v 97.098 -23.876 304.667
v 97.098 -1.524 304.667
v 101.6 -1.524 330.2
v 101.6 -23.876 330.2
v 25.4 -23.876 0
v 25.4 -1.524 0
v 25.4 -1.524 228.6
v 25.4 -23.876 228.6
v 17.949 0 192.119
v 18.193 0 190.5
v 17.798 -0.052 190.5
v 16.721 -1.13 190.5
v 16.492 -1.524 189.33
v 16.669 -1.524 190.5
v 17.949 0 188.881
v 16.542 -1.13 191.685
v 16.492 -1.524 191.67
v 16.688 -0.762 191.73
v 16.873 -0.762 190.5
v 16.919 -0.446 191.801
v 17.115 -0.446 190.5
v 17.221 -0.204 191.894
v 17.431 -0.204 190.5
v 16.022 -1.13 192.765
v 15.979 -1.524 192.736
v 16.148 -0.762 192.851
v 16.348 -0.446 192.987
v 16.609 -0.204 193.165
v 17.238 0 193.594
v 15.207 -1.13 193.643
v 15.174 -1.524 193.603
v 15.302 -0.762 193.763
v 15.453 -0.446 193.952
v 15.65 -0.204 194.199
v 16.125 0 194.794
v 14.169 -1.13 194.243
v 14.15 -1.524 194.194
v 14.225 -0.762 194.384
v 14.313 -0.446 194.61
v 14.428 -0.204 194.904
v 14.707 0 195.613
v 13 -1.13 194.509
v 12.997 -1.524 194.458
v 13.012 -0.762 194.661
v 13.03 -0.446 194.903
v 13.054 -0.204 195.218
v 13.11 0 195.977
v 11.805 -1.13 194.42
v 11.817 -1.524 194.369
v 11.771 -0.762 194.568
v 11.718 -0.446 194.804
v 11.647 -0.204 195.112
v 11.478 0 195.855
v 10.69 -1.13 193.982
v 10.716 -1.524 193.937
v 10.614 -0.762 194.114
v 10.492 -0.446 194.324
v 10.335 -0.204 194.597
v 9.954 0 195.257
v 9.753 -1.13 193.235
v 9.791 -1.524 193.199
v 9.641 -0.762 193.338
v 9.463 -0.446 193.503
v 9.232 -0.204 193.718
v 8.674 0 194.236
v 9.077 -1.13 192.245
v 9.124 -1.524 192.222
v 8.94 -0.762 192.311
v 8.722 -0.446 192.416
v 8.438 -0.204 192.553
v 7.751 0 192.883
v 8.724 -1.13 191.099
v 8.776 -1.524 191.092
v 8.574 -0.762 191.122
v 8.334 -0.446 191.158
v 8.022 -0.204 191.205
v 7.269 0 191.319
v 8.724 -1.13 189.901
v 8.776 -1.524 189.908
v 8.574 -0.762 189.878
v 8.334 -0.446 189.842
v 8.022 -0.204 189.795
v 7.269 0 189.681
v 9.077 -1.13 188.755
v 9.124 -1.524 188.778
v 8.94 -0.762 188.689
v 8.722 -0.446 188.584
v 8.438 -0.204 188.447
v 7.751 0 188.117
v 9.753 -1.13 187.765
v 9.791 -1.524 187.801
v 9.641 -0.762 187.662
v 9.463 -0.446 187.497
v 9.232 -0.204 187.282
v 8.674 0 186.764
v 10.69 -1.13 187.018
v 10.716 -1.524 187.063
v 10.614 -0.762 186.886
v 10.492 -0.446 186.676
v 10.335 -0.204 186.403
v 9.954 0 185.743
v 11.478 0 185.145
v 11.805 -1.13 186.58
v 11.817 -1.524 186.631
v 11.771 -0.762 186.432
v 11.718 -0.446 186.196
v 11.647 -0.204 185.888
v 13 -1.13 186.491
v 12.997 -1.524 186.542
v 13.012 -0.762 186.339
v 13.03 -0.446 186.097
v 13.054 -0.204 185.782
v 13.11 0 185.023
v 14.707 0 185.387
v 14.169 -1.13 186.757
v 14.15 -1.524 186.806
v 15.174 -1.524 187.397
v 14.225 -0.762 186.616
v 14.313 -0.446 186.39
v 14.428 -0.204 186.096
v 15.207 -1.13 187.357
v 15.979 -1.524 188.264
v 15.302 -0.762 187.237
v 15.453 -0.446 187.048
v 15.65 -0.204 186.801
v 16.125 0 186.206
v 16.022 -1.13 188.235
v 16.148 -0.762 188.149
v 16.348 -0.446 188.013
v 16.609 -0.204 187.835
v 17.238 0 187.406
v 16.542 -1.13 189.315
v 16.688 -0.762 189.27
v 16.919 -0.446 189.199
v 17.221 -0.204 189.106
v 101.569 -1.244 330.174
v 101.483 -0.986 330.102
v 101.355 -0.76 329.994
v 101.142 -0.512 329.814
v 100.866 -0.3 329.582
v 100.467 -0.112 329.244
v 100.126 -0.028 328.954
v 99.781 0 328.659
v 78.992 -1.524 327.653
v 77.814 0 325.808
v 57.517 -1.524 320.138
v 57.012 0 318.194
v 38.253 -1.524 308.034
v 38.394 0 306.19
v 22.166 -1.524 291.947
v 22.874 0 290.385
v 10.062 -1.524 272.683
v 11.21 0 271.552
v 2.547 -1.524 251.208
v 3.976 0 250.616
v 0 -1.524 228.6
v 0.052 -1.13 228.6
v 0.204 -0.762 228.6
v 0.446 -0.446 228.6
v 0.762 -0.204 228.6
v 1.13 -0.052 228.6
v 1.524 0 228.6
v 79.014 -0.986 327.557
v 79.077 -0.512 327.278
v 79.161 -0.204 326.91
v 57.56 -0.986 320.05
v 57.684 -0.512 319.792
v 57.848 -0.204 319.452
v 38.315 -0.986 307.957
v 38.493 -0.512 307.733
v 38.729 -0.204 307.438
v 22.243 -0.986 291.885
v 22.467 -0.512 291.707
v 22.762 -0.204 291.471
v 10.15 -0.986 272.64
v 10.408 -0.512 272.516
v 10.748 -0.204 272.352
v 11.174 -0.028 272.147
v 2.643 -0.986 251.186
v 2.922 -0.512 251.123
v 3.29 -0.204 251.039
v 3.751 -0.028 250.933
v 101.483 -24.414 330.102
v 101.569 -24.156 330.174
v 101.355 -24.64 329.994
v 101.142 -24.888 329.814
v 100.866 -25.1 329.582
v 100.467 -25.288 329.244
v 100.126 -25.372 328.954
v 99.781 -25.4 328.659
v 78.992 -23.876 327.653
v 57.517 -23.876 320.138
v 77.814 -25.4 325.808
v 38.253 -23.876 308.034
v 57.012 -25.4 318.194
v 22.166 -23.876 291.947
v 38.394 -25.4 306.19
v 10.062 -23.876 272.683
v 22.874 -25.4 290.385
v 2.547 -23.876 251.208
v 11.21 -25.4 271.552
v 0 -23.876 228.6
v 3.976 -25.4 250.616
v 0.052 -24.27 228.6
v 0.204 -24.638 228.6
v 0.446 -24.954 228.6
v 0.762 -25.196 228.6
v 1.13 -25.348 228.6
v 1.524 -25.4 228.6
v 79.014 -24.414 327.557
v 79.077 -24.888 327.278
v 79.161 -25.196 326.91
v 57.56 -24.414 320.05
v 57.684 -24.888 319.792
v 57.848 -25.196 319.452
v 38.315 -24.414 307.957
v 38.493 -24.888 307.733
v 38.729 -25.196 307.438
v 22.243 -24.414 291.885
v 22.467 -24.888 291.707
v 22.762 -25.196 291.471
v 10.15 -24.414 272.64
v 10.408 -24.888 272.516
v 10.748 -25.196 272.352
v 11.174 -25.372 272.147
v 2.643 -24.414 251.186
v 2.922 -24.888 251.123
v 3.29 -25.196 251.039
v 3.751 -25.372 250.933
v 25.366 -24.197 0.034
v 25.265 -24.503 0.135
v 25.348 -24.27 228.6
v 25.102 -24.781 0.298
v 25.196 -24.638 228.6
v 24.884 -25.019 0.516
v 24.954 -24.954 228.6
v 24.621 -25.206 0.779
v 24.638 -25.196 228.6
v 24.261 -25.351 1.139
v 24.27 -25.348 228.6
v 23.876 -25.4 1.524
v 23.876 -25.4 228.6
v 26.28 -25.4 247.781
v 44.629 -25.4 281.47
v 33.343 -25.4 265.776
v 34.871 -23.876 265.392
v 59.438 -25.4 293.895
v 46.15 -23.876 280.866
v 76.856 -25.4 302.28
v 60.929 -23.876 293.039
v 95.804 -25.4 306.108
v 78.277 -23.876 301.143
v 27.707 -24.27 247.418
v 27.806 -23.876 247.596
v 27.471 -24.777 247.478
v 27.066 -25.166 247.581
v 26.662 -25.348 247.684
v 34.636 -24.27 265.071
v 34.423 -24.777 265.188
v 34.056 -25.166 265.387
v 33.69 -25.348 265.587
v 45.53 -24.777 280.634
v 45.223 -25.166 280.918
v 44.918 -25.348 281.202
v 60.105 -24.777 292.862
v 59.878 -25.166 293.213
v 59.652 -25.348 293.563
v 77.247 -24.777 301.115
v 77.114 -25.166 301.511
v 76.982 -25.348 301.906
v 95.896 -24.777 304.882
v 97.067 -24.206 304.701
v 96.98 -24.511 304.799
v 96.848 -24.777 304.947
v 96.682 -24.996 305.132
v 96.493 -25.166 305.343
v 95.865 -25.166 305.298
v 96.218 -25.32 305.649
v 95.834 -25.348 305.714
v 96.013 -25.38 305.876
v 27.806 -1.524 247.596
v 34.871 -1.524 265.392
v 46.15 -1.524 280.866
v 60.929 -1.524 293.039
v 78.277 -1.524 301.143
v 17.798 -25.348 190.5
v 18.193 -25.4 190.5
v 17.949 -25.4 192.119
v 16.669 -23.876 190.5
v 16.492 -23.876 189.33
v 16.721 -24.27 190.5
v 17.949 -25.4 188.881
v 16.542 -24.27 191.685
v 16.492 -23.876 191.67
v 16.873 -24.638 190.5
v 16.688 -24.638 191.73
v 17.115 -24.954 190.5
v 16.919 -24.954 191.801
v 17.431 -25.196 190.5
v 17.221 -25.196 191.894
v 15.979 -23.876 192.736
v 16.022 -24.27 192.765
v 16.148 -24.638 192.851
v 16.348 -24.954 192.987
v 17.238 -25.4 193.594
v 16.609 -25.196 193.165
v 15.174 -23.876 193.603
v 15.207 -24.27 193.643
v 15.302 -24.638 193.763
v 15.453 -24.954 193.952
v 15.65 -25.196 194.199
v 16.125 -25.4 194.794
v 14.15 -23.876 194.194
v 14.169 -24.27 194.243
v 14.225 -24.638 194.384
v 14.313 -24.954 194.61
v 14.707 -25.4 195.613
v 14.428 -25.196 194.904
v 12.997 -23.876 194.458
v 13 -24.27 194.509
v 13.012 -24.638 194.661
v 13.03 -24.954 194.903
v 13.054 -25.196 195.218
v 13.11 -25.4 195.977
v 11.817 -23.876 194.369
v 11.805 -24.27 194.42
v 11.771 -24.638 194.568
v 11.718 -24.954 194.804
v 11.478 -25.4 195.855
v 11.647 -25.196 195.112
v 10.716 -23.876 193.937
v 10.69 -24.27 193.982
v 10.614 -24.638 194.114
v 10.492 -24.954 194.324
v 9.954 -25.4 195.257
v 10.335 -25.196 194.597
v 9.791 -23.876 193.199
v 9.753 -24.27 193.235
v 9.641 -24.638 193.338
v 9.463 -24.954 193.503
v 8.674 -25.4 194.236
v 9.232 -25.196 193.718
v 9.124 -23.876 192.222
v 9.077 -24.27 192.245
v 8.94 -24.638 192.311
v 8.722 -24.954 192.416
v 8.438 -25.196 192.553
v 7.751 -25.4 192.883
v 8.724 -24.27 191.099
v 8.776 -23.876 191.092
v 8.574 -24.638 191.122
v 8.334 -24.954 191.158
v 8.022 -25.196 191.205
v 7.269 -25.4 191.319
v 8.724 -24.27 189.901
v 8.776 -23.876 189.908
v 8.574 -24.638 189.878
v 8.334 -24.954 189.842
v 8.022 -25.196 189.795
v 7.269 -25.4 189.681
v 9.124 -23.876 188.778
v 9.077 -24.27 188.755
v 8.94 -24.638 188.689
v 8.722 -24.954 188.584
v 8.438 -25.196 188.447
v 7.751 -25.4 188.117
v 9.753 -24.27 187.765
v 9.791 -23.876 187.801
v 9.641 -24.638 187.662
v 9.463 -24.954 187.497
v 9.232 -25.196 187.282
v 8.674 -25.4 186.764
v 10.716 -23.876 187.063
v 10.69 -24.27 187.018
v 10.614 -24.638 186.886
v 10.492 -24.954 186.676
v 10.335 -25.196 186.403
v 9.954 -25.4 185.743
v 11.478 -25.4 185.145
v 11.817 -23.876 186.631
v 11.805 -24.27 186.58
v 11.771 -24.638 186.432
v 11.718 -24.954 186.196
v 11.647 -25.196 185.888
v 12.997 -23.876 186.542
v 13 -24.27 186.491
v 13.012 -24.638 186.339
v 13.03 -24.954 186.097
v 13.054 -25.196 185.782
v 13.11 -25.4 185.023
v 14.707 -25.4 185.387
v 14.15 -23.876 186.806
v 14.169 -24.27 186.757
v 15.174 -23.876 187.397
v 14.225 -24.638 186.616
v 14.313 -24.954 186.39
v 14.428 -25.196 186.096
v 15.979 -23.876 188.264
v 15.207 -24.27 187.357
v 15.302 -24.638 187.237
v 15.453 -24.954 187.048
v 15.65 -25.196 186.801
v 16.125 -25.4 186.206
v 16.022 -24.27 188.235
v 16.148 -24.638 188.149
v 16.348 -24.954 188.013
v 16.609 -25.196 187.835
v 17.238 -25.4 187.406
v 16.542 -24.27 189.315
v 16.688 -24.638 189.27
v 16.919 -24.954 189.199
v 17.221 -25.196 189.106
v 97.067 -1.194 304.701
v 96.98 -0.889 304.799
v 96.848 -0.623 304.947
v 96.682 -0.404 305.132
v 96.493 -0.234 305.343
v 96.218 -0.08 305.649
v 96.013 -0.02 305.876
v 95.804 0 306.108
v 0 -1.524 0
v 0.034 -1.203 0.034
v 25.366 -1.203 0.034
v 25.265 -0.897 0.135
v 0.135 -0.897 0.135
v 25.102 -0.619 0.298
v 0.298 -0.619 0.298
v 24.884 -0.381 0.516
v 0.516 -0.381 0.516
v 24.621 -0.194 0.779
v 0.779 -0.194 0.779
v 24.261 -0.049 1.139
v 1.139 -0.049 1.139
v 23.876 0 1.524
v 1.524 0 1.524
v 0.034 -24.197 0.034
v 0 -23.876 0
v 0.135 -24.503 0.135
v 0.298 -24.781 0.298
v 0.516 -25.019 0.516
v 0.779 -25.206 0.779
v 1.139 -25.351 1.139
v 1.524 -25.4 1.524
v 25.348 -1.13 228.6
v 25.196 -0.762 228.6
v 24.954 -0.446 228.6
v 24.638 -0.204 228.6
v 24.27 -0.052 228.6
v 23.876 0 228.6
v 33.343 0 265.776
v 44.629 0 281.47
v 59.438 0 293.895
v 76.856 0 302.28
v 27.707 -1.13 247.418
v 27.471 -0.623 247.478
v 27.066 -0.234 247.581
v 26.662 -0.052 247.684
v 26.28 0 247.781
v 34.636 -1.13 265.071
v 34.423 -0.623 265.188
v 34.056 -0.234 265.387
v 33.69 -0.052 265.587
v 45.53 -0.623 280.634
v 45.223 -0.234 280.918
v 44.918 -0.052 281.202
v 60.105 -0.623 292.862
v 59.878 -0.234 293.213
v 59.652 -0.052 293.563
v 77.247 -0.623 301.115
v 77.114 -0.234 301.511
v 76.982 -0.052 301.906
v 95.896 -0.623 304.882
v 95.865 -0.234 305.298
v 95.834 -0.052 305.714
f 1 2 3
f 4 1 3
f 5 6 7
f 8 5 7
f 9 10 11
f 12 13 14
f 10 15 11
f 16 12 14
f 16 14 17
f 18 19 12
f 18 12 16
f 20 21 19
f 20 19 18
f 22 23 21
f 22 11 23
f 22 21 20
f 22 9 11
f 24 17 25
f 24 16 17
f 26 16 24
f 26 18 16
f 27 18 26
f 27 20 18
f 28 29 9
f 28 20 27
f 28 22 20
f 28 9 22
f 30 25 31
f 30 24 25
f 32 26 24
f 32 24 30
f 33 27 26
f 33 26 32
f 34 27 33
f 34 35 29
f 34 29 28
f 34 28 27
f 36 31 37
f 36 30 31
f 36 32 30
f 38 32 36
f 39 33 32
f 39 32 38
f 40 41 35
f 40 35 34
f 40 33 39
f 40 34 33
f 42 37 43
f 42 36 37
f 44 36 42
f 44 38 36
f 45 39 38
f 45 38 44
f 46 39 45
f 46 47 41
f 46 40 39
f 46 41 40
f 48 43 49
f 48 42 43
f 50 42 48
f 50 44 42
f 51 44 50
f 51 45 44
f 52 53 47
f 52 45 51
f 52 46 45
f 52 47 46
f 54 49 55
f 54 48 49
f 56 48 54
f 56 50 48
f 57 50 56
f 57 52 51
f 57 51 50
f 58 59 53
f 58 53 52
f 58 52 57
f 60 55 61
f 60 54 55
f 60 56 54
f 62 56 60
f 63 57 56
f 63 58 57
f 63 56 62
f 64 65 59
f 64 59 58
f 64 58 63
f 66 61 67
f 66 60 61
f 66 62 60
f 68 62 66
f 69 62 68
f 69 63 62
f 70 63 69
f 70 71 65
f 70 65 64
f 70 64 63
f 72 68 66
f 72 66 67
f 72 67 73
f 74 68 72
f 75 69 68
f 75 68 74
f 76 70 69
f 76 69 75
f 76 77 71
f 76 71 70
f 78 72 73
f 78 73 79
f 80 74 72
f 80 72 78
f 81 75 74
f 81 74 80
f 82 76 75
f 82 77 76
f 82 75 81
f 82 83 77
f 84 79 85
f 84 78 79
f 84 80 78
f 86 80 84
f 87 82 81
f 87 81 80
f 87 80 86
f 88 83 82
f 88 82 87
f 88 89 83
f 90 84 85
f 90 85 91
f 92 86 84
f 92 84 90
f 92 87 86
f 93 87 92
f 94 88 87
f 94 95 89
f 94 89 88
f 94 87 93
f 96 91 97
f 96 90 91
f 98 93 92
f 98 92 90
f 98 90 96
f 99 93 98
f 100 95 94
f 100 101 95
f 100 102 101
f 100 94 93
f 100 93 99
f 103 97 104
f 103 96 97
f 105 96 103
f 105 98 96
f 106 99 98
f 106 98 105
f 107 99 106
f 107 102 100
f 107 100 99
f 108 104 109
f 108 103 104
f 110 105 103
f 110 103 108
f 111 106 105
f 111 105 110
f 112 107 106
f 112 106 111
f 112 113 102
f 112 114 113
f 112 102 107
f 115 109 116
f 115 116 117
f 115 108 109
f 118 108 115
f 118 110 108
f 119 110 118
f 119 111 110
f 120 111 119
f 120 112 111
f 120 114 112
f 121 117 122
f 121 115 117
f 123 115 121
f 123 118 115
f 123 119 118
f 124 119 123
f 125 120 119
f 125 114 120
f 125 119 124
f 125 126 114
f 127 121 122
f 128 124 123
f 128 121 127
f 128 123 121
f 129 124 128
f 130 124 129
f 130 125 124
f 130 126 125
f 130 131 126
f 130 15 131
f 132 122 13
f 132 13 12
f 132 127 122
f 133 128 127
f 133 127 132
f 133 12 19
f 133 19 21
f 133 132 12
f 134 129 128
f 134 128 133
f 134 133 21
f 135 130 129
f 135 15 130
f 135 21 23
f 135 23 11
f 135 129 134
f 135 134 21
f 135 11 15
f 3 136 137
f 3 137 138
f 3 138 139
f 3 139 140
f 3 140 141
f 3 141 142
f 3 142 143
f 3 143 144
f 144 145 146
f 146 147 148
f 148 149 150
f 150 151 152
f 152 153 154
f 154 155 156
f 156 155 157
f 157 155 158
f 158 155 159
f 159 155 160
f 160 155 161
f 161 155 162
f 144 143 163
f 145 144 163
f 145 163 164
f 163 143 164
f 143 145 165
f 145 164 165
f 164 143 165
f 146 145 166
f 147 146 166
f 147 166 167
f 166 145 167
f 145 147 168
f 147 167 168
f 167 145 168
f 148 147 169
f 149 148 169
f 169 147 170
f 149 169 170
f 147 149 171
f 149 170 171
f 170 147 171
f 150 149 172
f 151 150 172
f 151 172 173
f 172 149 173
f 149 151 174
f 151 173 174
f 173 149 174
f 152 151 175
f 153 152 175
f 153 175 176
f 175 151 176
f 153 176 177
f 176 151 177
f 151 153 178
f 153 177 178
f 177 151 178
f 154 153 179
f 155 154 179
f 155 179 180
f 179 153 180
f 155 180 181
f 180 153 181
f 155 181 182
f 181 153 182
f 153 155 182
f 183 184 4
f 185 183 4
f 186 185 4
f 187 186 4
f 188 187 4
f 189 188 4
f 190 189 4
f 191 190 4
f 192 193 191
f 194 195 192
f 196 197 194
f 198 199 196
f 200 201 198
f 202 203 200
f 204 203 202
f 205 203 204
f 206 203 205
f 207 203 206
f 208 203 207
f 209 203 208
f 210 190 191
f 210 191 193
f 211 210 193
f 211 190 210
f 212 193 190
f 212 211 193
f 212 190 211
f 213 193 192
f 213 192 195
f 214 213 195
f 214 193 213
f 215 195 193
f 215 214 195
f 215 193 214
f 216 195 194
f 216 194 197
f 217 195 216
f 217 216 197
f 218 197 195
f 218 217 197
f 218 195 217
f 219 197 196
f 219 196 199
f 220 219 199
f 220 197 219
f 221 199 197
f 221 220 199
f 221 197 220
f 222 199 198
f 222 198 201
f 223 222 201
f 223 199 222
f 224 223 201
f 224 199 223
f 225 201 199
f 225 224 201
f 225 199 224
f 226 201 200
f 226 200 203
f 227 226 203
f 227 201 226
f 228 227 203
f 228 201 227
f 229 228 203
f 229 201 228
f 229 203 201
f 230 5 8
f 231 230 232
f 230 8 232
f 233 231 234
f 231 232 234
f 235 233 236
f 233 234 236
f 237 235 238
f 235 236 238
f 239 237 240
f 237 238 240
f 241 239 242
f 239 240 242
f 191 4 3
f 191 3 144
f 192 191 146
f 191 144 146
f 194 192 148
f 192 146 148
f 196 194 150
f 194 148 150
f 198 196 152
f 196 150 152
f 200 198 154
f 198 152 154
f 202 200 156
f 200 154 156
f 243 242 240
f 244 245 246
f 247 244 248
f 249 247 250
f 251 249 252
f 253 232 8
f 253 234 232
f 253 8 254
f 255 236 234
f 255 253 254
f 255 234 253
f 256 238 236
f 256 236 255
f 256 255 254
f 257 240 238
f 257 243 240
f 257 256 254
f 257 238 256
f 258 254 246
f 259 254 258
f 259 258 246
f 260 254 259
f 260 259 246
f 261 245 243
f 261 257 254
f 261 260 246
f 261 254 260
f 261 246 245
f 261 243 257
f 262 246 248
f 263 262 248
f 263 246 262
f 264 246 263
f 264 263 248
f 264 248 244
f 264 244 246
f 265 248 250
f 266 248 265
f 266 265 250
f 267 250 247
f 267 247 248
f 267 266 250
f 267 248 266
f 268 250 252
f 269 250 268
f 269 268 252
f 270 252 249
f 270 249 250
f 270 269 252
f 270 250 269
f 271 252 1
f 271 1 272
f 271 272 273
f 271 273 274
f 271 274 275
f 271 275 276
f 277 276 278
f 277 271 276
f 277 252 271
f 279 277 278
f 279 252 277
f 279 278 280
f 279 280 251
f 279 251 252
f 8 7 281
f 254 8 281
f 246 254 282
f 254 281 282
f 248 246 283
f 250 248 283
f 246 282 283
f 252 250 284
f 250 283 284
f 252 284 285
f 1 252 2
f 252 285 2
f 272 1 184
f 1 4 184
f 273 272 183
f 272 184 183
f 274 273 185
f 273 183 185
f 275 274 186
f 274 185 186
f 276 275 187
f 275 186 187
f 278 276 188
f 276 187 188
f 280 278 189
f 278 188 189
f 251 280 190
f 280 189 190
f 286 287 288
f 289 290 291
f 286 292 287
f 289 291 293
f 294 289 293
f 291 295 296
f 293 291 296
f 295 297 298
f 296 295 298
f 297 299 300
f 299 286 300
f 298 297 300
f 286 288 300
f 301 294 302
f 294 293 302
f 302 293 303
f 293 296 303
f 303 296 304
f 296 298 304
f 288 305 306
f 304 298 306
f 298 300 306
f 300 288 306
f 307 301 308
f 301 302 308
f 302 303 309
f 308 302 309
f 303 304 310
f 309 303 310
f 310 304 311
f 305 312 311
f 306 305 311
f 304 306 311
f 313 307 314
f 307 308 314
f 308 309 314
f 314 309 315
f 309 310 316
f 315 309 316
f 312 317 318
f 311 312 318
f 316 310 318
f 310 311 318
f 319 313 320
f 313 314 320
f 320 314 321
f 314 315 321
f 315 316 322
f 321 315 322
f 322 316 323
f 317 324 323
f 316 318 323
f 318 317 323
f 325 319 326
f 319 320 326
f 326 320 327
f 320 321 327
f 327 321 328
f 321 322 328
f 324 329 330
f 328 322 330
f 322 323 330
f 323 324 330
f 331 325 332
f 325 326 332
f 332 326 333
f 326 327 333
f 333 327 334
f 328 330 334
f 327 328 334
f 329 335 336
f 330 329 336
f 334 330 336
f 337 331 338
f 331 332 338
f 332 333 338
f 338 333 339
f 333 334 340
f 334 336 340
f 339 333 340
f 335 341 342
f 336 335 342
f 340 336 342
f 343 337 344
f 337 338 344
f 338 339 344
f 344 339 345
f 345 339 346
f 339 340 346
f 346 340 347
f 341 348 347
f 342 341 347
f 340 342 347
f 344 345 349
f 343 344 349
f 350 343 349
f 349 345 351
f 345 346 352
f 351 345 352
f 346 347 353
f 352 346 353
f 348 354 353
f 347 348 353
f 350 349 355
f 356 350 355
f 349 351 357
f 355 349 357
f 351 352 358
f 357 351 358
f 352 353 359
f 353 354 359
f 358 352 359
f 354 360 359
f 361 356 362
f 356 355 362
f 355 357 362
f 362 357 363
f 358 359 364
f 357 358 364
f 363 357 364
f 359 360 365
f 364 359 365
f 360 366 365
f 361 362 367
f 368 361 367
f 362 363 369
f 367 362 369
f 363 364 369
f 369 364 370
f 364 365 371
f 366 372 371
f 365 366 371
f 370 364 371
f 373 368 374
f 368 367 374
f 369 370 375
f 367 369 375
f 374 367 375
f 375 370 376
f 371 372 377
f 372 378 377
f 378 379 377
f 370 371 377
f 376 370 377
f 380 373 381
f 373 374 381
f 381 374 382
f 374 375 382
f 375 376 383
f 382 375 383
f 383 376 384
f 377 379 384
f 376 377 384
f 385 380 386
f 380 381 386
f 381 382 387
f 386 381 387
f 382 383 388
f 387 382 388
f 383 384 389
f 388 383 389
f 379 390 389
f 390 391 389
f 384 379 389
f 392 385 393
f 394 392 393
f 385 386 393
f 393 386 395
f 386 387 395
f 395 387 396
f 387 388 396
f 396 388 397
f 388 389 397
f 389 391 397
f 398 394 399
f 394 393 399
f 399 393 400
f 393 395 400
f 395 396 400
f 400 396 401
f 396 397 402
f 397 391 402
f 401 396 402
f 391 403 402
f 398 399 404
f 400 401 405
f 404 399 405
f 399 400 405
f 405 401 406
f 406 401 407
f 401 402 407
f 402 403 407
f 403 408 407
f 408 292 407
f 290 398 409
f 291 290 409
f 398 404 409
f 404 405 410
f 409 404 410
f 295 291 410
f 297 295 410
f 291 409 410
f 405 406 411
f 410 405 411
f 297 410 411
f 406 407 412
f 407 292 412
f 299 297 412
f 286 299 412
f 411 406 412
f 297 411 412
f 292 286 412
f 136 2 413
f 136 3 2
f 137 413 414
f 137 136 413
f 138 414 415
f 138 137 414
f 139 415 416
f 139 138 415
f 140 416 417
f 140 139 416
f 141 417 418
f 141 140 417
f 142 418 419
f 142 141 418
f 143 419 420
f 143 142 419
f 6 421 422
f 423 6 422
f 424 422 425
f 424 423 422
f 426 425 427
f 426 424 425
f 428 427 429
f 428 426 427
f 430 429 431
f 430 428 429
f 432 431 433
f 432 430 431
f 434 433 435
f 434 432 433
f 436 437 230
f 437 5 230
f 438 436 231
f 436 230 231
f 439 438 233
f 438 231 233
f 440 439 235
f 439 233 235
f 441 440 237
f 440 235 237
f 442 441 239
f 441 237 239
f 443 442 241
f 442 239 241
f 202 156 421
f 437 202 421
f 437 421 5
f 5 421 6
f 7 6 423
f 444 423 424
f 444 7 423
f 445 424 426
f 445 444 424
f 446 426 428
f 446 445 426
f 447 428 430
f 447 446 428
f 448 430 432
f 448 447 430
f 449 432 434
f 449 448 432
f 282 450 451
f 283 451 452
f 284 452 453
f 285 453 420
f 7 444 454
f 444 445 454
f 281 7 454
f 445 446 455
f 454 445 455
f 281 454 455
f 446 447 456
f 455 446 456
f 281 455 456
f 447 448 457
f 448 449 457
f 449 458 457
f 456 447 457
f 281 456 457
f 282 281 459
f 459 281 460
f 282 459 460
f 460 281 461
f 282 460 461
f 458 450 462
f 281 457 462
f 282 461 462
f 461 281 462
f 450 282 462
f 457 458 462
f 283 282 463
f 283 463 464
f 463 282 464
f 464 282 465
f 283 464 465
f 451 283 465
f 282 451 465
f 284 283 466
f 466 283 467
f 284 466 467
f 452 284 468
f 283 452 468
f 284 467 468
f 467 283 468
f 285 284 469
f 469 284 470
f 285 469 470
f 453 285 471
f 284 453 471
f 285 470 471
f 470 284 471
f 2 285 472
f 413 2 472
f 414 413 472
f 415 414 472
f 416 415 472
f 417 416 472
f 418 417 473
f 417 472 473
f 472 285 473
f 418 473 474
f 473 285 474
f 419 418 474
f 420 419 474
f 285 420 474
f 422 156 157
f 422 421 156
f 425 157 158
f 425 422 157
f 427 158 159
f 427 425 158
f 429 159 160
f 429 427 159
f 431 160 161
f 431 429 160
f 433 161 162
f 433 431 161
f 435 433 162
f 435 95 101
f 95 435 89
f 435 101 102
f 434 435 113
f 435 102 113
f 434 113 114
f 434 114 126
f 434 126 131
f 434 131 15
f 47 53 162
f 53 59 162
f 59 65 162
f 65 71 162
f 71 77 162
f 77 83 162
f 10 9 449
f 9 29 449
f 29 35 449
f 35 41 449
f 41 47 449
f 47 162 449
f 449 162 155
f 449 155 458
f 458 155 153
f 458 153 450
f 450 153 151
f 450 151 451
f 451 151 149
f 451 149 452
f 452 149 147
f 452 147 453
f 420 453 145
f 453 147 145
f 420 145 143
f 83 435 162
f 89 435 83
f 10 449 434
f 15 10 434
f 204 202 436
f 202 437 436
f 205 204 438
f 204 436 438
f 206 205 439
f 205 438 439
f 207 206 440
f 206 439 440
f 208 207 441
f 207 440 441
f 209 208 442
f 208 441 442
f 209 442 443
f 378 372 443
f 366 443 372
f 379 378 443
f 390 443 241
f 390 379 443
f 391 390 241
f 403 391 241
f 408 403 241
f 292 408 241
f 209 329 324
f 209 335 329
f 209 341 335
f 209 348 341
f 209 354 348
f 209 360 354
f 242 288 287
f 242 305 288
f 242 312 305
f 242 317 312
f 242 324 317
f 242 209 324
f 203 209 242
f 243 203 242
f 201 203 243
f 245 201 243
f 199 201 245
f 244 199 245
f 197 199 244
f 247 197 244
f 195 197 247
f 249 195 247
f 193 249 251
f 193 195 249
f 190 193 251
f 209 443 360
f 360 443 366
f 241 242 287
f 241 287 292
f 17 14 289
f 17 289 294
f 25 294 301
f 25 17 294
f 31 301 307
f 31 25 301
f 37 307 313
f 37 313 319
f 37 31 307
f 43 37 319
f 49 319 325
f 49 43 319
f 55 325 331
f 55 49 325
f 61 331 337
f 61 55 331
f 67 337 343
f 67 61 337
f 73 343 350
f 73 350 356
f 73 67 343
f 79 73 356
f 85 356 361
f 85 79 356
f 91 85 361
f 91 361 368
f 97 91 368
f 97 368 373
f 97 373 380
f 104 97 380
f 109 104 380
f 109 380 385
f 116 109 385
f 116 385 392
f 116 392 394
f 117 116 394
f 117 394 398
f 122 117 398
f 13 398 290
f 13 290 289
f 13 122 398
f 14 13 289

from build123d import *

# Parameters (mm, degrees)
F0_R     = 3.96875
F1_DEPTH = 25.4
F2_R     = 1.524


with BuildPart() as f1:
    # F0 (on Front) → F1 (new body)
    with BuildSketch(Plane.XZ):
        with BuildLine():
            Line((0, 228.6), (0, 0))
            Line((0, 0), (25.4, 0))
            Line((25.4, 0), (25.4, 228.6))
            ThreePointArc((25.4, 228.6), (46.149545, 280.865543), (97.097822, 304.666881))
            Line((97.097822, 304.666881), (101.6, 330.2))
            ThreePointArc((101.6, 330.2), (29.757951, 300.442049), (0, 228.6))
        make_face()
        with Locations((12.7, 190.5)):
            Circle(F0_R, mode=Mode.SUBTRACT)
    extrude(amount=F1_DEPTH)

    # F2
    f2_edges = [f1.edges().sort_by_distance(p)[0] for p in [
        (0, -25.4, 114.3),
        (12.7, -25.4, 0),
        (25.4, -25.4, 114.3),
        (46.149545, -25.4, 280.865543),
        (99.348911, -25.4, 317.433441),
        (29.757951, -25.4, 300.442049),
        (8.73125, -25.4, 190.5),
        (0, 0, 114.3),
        (12.7, 0, 0),
        (25.4, 0, 114.3),
        (46.149545, 0, 280.865543),
        (99.348911, 0, 317.433441),
        (29.757951, 0, 300.442049),
        (8.73125, 0, 190.5),
    ]]
    fillet(f2_edges, radius=F2_R)


solid = f1.part
